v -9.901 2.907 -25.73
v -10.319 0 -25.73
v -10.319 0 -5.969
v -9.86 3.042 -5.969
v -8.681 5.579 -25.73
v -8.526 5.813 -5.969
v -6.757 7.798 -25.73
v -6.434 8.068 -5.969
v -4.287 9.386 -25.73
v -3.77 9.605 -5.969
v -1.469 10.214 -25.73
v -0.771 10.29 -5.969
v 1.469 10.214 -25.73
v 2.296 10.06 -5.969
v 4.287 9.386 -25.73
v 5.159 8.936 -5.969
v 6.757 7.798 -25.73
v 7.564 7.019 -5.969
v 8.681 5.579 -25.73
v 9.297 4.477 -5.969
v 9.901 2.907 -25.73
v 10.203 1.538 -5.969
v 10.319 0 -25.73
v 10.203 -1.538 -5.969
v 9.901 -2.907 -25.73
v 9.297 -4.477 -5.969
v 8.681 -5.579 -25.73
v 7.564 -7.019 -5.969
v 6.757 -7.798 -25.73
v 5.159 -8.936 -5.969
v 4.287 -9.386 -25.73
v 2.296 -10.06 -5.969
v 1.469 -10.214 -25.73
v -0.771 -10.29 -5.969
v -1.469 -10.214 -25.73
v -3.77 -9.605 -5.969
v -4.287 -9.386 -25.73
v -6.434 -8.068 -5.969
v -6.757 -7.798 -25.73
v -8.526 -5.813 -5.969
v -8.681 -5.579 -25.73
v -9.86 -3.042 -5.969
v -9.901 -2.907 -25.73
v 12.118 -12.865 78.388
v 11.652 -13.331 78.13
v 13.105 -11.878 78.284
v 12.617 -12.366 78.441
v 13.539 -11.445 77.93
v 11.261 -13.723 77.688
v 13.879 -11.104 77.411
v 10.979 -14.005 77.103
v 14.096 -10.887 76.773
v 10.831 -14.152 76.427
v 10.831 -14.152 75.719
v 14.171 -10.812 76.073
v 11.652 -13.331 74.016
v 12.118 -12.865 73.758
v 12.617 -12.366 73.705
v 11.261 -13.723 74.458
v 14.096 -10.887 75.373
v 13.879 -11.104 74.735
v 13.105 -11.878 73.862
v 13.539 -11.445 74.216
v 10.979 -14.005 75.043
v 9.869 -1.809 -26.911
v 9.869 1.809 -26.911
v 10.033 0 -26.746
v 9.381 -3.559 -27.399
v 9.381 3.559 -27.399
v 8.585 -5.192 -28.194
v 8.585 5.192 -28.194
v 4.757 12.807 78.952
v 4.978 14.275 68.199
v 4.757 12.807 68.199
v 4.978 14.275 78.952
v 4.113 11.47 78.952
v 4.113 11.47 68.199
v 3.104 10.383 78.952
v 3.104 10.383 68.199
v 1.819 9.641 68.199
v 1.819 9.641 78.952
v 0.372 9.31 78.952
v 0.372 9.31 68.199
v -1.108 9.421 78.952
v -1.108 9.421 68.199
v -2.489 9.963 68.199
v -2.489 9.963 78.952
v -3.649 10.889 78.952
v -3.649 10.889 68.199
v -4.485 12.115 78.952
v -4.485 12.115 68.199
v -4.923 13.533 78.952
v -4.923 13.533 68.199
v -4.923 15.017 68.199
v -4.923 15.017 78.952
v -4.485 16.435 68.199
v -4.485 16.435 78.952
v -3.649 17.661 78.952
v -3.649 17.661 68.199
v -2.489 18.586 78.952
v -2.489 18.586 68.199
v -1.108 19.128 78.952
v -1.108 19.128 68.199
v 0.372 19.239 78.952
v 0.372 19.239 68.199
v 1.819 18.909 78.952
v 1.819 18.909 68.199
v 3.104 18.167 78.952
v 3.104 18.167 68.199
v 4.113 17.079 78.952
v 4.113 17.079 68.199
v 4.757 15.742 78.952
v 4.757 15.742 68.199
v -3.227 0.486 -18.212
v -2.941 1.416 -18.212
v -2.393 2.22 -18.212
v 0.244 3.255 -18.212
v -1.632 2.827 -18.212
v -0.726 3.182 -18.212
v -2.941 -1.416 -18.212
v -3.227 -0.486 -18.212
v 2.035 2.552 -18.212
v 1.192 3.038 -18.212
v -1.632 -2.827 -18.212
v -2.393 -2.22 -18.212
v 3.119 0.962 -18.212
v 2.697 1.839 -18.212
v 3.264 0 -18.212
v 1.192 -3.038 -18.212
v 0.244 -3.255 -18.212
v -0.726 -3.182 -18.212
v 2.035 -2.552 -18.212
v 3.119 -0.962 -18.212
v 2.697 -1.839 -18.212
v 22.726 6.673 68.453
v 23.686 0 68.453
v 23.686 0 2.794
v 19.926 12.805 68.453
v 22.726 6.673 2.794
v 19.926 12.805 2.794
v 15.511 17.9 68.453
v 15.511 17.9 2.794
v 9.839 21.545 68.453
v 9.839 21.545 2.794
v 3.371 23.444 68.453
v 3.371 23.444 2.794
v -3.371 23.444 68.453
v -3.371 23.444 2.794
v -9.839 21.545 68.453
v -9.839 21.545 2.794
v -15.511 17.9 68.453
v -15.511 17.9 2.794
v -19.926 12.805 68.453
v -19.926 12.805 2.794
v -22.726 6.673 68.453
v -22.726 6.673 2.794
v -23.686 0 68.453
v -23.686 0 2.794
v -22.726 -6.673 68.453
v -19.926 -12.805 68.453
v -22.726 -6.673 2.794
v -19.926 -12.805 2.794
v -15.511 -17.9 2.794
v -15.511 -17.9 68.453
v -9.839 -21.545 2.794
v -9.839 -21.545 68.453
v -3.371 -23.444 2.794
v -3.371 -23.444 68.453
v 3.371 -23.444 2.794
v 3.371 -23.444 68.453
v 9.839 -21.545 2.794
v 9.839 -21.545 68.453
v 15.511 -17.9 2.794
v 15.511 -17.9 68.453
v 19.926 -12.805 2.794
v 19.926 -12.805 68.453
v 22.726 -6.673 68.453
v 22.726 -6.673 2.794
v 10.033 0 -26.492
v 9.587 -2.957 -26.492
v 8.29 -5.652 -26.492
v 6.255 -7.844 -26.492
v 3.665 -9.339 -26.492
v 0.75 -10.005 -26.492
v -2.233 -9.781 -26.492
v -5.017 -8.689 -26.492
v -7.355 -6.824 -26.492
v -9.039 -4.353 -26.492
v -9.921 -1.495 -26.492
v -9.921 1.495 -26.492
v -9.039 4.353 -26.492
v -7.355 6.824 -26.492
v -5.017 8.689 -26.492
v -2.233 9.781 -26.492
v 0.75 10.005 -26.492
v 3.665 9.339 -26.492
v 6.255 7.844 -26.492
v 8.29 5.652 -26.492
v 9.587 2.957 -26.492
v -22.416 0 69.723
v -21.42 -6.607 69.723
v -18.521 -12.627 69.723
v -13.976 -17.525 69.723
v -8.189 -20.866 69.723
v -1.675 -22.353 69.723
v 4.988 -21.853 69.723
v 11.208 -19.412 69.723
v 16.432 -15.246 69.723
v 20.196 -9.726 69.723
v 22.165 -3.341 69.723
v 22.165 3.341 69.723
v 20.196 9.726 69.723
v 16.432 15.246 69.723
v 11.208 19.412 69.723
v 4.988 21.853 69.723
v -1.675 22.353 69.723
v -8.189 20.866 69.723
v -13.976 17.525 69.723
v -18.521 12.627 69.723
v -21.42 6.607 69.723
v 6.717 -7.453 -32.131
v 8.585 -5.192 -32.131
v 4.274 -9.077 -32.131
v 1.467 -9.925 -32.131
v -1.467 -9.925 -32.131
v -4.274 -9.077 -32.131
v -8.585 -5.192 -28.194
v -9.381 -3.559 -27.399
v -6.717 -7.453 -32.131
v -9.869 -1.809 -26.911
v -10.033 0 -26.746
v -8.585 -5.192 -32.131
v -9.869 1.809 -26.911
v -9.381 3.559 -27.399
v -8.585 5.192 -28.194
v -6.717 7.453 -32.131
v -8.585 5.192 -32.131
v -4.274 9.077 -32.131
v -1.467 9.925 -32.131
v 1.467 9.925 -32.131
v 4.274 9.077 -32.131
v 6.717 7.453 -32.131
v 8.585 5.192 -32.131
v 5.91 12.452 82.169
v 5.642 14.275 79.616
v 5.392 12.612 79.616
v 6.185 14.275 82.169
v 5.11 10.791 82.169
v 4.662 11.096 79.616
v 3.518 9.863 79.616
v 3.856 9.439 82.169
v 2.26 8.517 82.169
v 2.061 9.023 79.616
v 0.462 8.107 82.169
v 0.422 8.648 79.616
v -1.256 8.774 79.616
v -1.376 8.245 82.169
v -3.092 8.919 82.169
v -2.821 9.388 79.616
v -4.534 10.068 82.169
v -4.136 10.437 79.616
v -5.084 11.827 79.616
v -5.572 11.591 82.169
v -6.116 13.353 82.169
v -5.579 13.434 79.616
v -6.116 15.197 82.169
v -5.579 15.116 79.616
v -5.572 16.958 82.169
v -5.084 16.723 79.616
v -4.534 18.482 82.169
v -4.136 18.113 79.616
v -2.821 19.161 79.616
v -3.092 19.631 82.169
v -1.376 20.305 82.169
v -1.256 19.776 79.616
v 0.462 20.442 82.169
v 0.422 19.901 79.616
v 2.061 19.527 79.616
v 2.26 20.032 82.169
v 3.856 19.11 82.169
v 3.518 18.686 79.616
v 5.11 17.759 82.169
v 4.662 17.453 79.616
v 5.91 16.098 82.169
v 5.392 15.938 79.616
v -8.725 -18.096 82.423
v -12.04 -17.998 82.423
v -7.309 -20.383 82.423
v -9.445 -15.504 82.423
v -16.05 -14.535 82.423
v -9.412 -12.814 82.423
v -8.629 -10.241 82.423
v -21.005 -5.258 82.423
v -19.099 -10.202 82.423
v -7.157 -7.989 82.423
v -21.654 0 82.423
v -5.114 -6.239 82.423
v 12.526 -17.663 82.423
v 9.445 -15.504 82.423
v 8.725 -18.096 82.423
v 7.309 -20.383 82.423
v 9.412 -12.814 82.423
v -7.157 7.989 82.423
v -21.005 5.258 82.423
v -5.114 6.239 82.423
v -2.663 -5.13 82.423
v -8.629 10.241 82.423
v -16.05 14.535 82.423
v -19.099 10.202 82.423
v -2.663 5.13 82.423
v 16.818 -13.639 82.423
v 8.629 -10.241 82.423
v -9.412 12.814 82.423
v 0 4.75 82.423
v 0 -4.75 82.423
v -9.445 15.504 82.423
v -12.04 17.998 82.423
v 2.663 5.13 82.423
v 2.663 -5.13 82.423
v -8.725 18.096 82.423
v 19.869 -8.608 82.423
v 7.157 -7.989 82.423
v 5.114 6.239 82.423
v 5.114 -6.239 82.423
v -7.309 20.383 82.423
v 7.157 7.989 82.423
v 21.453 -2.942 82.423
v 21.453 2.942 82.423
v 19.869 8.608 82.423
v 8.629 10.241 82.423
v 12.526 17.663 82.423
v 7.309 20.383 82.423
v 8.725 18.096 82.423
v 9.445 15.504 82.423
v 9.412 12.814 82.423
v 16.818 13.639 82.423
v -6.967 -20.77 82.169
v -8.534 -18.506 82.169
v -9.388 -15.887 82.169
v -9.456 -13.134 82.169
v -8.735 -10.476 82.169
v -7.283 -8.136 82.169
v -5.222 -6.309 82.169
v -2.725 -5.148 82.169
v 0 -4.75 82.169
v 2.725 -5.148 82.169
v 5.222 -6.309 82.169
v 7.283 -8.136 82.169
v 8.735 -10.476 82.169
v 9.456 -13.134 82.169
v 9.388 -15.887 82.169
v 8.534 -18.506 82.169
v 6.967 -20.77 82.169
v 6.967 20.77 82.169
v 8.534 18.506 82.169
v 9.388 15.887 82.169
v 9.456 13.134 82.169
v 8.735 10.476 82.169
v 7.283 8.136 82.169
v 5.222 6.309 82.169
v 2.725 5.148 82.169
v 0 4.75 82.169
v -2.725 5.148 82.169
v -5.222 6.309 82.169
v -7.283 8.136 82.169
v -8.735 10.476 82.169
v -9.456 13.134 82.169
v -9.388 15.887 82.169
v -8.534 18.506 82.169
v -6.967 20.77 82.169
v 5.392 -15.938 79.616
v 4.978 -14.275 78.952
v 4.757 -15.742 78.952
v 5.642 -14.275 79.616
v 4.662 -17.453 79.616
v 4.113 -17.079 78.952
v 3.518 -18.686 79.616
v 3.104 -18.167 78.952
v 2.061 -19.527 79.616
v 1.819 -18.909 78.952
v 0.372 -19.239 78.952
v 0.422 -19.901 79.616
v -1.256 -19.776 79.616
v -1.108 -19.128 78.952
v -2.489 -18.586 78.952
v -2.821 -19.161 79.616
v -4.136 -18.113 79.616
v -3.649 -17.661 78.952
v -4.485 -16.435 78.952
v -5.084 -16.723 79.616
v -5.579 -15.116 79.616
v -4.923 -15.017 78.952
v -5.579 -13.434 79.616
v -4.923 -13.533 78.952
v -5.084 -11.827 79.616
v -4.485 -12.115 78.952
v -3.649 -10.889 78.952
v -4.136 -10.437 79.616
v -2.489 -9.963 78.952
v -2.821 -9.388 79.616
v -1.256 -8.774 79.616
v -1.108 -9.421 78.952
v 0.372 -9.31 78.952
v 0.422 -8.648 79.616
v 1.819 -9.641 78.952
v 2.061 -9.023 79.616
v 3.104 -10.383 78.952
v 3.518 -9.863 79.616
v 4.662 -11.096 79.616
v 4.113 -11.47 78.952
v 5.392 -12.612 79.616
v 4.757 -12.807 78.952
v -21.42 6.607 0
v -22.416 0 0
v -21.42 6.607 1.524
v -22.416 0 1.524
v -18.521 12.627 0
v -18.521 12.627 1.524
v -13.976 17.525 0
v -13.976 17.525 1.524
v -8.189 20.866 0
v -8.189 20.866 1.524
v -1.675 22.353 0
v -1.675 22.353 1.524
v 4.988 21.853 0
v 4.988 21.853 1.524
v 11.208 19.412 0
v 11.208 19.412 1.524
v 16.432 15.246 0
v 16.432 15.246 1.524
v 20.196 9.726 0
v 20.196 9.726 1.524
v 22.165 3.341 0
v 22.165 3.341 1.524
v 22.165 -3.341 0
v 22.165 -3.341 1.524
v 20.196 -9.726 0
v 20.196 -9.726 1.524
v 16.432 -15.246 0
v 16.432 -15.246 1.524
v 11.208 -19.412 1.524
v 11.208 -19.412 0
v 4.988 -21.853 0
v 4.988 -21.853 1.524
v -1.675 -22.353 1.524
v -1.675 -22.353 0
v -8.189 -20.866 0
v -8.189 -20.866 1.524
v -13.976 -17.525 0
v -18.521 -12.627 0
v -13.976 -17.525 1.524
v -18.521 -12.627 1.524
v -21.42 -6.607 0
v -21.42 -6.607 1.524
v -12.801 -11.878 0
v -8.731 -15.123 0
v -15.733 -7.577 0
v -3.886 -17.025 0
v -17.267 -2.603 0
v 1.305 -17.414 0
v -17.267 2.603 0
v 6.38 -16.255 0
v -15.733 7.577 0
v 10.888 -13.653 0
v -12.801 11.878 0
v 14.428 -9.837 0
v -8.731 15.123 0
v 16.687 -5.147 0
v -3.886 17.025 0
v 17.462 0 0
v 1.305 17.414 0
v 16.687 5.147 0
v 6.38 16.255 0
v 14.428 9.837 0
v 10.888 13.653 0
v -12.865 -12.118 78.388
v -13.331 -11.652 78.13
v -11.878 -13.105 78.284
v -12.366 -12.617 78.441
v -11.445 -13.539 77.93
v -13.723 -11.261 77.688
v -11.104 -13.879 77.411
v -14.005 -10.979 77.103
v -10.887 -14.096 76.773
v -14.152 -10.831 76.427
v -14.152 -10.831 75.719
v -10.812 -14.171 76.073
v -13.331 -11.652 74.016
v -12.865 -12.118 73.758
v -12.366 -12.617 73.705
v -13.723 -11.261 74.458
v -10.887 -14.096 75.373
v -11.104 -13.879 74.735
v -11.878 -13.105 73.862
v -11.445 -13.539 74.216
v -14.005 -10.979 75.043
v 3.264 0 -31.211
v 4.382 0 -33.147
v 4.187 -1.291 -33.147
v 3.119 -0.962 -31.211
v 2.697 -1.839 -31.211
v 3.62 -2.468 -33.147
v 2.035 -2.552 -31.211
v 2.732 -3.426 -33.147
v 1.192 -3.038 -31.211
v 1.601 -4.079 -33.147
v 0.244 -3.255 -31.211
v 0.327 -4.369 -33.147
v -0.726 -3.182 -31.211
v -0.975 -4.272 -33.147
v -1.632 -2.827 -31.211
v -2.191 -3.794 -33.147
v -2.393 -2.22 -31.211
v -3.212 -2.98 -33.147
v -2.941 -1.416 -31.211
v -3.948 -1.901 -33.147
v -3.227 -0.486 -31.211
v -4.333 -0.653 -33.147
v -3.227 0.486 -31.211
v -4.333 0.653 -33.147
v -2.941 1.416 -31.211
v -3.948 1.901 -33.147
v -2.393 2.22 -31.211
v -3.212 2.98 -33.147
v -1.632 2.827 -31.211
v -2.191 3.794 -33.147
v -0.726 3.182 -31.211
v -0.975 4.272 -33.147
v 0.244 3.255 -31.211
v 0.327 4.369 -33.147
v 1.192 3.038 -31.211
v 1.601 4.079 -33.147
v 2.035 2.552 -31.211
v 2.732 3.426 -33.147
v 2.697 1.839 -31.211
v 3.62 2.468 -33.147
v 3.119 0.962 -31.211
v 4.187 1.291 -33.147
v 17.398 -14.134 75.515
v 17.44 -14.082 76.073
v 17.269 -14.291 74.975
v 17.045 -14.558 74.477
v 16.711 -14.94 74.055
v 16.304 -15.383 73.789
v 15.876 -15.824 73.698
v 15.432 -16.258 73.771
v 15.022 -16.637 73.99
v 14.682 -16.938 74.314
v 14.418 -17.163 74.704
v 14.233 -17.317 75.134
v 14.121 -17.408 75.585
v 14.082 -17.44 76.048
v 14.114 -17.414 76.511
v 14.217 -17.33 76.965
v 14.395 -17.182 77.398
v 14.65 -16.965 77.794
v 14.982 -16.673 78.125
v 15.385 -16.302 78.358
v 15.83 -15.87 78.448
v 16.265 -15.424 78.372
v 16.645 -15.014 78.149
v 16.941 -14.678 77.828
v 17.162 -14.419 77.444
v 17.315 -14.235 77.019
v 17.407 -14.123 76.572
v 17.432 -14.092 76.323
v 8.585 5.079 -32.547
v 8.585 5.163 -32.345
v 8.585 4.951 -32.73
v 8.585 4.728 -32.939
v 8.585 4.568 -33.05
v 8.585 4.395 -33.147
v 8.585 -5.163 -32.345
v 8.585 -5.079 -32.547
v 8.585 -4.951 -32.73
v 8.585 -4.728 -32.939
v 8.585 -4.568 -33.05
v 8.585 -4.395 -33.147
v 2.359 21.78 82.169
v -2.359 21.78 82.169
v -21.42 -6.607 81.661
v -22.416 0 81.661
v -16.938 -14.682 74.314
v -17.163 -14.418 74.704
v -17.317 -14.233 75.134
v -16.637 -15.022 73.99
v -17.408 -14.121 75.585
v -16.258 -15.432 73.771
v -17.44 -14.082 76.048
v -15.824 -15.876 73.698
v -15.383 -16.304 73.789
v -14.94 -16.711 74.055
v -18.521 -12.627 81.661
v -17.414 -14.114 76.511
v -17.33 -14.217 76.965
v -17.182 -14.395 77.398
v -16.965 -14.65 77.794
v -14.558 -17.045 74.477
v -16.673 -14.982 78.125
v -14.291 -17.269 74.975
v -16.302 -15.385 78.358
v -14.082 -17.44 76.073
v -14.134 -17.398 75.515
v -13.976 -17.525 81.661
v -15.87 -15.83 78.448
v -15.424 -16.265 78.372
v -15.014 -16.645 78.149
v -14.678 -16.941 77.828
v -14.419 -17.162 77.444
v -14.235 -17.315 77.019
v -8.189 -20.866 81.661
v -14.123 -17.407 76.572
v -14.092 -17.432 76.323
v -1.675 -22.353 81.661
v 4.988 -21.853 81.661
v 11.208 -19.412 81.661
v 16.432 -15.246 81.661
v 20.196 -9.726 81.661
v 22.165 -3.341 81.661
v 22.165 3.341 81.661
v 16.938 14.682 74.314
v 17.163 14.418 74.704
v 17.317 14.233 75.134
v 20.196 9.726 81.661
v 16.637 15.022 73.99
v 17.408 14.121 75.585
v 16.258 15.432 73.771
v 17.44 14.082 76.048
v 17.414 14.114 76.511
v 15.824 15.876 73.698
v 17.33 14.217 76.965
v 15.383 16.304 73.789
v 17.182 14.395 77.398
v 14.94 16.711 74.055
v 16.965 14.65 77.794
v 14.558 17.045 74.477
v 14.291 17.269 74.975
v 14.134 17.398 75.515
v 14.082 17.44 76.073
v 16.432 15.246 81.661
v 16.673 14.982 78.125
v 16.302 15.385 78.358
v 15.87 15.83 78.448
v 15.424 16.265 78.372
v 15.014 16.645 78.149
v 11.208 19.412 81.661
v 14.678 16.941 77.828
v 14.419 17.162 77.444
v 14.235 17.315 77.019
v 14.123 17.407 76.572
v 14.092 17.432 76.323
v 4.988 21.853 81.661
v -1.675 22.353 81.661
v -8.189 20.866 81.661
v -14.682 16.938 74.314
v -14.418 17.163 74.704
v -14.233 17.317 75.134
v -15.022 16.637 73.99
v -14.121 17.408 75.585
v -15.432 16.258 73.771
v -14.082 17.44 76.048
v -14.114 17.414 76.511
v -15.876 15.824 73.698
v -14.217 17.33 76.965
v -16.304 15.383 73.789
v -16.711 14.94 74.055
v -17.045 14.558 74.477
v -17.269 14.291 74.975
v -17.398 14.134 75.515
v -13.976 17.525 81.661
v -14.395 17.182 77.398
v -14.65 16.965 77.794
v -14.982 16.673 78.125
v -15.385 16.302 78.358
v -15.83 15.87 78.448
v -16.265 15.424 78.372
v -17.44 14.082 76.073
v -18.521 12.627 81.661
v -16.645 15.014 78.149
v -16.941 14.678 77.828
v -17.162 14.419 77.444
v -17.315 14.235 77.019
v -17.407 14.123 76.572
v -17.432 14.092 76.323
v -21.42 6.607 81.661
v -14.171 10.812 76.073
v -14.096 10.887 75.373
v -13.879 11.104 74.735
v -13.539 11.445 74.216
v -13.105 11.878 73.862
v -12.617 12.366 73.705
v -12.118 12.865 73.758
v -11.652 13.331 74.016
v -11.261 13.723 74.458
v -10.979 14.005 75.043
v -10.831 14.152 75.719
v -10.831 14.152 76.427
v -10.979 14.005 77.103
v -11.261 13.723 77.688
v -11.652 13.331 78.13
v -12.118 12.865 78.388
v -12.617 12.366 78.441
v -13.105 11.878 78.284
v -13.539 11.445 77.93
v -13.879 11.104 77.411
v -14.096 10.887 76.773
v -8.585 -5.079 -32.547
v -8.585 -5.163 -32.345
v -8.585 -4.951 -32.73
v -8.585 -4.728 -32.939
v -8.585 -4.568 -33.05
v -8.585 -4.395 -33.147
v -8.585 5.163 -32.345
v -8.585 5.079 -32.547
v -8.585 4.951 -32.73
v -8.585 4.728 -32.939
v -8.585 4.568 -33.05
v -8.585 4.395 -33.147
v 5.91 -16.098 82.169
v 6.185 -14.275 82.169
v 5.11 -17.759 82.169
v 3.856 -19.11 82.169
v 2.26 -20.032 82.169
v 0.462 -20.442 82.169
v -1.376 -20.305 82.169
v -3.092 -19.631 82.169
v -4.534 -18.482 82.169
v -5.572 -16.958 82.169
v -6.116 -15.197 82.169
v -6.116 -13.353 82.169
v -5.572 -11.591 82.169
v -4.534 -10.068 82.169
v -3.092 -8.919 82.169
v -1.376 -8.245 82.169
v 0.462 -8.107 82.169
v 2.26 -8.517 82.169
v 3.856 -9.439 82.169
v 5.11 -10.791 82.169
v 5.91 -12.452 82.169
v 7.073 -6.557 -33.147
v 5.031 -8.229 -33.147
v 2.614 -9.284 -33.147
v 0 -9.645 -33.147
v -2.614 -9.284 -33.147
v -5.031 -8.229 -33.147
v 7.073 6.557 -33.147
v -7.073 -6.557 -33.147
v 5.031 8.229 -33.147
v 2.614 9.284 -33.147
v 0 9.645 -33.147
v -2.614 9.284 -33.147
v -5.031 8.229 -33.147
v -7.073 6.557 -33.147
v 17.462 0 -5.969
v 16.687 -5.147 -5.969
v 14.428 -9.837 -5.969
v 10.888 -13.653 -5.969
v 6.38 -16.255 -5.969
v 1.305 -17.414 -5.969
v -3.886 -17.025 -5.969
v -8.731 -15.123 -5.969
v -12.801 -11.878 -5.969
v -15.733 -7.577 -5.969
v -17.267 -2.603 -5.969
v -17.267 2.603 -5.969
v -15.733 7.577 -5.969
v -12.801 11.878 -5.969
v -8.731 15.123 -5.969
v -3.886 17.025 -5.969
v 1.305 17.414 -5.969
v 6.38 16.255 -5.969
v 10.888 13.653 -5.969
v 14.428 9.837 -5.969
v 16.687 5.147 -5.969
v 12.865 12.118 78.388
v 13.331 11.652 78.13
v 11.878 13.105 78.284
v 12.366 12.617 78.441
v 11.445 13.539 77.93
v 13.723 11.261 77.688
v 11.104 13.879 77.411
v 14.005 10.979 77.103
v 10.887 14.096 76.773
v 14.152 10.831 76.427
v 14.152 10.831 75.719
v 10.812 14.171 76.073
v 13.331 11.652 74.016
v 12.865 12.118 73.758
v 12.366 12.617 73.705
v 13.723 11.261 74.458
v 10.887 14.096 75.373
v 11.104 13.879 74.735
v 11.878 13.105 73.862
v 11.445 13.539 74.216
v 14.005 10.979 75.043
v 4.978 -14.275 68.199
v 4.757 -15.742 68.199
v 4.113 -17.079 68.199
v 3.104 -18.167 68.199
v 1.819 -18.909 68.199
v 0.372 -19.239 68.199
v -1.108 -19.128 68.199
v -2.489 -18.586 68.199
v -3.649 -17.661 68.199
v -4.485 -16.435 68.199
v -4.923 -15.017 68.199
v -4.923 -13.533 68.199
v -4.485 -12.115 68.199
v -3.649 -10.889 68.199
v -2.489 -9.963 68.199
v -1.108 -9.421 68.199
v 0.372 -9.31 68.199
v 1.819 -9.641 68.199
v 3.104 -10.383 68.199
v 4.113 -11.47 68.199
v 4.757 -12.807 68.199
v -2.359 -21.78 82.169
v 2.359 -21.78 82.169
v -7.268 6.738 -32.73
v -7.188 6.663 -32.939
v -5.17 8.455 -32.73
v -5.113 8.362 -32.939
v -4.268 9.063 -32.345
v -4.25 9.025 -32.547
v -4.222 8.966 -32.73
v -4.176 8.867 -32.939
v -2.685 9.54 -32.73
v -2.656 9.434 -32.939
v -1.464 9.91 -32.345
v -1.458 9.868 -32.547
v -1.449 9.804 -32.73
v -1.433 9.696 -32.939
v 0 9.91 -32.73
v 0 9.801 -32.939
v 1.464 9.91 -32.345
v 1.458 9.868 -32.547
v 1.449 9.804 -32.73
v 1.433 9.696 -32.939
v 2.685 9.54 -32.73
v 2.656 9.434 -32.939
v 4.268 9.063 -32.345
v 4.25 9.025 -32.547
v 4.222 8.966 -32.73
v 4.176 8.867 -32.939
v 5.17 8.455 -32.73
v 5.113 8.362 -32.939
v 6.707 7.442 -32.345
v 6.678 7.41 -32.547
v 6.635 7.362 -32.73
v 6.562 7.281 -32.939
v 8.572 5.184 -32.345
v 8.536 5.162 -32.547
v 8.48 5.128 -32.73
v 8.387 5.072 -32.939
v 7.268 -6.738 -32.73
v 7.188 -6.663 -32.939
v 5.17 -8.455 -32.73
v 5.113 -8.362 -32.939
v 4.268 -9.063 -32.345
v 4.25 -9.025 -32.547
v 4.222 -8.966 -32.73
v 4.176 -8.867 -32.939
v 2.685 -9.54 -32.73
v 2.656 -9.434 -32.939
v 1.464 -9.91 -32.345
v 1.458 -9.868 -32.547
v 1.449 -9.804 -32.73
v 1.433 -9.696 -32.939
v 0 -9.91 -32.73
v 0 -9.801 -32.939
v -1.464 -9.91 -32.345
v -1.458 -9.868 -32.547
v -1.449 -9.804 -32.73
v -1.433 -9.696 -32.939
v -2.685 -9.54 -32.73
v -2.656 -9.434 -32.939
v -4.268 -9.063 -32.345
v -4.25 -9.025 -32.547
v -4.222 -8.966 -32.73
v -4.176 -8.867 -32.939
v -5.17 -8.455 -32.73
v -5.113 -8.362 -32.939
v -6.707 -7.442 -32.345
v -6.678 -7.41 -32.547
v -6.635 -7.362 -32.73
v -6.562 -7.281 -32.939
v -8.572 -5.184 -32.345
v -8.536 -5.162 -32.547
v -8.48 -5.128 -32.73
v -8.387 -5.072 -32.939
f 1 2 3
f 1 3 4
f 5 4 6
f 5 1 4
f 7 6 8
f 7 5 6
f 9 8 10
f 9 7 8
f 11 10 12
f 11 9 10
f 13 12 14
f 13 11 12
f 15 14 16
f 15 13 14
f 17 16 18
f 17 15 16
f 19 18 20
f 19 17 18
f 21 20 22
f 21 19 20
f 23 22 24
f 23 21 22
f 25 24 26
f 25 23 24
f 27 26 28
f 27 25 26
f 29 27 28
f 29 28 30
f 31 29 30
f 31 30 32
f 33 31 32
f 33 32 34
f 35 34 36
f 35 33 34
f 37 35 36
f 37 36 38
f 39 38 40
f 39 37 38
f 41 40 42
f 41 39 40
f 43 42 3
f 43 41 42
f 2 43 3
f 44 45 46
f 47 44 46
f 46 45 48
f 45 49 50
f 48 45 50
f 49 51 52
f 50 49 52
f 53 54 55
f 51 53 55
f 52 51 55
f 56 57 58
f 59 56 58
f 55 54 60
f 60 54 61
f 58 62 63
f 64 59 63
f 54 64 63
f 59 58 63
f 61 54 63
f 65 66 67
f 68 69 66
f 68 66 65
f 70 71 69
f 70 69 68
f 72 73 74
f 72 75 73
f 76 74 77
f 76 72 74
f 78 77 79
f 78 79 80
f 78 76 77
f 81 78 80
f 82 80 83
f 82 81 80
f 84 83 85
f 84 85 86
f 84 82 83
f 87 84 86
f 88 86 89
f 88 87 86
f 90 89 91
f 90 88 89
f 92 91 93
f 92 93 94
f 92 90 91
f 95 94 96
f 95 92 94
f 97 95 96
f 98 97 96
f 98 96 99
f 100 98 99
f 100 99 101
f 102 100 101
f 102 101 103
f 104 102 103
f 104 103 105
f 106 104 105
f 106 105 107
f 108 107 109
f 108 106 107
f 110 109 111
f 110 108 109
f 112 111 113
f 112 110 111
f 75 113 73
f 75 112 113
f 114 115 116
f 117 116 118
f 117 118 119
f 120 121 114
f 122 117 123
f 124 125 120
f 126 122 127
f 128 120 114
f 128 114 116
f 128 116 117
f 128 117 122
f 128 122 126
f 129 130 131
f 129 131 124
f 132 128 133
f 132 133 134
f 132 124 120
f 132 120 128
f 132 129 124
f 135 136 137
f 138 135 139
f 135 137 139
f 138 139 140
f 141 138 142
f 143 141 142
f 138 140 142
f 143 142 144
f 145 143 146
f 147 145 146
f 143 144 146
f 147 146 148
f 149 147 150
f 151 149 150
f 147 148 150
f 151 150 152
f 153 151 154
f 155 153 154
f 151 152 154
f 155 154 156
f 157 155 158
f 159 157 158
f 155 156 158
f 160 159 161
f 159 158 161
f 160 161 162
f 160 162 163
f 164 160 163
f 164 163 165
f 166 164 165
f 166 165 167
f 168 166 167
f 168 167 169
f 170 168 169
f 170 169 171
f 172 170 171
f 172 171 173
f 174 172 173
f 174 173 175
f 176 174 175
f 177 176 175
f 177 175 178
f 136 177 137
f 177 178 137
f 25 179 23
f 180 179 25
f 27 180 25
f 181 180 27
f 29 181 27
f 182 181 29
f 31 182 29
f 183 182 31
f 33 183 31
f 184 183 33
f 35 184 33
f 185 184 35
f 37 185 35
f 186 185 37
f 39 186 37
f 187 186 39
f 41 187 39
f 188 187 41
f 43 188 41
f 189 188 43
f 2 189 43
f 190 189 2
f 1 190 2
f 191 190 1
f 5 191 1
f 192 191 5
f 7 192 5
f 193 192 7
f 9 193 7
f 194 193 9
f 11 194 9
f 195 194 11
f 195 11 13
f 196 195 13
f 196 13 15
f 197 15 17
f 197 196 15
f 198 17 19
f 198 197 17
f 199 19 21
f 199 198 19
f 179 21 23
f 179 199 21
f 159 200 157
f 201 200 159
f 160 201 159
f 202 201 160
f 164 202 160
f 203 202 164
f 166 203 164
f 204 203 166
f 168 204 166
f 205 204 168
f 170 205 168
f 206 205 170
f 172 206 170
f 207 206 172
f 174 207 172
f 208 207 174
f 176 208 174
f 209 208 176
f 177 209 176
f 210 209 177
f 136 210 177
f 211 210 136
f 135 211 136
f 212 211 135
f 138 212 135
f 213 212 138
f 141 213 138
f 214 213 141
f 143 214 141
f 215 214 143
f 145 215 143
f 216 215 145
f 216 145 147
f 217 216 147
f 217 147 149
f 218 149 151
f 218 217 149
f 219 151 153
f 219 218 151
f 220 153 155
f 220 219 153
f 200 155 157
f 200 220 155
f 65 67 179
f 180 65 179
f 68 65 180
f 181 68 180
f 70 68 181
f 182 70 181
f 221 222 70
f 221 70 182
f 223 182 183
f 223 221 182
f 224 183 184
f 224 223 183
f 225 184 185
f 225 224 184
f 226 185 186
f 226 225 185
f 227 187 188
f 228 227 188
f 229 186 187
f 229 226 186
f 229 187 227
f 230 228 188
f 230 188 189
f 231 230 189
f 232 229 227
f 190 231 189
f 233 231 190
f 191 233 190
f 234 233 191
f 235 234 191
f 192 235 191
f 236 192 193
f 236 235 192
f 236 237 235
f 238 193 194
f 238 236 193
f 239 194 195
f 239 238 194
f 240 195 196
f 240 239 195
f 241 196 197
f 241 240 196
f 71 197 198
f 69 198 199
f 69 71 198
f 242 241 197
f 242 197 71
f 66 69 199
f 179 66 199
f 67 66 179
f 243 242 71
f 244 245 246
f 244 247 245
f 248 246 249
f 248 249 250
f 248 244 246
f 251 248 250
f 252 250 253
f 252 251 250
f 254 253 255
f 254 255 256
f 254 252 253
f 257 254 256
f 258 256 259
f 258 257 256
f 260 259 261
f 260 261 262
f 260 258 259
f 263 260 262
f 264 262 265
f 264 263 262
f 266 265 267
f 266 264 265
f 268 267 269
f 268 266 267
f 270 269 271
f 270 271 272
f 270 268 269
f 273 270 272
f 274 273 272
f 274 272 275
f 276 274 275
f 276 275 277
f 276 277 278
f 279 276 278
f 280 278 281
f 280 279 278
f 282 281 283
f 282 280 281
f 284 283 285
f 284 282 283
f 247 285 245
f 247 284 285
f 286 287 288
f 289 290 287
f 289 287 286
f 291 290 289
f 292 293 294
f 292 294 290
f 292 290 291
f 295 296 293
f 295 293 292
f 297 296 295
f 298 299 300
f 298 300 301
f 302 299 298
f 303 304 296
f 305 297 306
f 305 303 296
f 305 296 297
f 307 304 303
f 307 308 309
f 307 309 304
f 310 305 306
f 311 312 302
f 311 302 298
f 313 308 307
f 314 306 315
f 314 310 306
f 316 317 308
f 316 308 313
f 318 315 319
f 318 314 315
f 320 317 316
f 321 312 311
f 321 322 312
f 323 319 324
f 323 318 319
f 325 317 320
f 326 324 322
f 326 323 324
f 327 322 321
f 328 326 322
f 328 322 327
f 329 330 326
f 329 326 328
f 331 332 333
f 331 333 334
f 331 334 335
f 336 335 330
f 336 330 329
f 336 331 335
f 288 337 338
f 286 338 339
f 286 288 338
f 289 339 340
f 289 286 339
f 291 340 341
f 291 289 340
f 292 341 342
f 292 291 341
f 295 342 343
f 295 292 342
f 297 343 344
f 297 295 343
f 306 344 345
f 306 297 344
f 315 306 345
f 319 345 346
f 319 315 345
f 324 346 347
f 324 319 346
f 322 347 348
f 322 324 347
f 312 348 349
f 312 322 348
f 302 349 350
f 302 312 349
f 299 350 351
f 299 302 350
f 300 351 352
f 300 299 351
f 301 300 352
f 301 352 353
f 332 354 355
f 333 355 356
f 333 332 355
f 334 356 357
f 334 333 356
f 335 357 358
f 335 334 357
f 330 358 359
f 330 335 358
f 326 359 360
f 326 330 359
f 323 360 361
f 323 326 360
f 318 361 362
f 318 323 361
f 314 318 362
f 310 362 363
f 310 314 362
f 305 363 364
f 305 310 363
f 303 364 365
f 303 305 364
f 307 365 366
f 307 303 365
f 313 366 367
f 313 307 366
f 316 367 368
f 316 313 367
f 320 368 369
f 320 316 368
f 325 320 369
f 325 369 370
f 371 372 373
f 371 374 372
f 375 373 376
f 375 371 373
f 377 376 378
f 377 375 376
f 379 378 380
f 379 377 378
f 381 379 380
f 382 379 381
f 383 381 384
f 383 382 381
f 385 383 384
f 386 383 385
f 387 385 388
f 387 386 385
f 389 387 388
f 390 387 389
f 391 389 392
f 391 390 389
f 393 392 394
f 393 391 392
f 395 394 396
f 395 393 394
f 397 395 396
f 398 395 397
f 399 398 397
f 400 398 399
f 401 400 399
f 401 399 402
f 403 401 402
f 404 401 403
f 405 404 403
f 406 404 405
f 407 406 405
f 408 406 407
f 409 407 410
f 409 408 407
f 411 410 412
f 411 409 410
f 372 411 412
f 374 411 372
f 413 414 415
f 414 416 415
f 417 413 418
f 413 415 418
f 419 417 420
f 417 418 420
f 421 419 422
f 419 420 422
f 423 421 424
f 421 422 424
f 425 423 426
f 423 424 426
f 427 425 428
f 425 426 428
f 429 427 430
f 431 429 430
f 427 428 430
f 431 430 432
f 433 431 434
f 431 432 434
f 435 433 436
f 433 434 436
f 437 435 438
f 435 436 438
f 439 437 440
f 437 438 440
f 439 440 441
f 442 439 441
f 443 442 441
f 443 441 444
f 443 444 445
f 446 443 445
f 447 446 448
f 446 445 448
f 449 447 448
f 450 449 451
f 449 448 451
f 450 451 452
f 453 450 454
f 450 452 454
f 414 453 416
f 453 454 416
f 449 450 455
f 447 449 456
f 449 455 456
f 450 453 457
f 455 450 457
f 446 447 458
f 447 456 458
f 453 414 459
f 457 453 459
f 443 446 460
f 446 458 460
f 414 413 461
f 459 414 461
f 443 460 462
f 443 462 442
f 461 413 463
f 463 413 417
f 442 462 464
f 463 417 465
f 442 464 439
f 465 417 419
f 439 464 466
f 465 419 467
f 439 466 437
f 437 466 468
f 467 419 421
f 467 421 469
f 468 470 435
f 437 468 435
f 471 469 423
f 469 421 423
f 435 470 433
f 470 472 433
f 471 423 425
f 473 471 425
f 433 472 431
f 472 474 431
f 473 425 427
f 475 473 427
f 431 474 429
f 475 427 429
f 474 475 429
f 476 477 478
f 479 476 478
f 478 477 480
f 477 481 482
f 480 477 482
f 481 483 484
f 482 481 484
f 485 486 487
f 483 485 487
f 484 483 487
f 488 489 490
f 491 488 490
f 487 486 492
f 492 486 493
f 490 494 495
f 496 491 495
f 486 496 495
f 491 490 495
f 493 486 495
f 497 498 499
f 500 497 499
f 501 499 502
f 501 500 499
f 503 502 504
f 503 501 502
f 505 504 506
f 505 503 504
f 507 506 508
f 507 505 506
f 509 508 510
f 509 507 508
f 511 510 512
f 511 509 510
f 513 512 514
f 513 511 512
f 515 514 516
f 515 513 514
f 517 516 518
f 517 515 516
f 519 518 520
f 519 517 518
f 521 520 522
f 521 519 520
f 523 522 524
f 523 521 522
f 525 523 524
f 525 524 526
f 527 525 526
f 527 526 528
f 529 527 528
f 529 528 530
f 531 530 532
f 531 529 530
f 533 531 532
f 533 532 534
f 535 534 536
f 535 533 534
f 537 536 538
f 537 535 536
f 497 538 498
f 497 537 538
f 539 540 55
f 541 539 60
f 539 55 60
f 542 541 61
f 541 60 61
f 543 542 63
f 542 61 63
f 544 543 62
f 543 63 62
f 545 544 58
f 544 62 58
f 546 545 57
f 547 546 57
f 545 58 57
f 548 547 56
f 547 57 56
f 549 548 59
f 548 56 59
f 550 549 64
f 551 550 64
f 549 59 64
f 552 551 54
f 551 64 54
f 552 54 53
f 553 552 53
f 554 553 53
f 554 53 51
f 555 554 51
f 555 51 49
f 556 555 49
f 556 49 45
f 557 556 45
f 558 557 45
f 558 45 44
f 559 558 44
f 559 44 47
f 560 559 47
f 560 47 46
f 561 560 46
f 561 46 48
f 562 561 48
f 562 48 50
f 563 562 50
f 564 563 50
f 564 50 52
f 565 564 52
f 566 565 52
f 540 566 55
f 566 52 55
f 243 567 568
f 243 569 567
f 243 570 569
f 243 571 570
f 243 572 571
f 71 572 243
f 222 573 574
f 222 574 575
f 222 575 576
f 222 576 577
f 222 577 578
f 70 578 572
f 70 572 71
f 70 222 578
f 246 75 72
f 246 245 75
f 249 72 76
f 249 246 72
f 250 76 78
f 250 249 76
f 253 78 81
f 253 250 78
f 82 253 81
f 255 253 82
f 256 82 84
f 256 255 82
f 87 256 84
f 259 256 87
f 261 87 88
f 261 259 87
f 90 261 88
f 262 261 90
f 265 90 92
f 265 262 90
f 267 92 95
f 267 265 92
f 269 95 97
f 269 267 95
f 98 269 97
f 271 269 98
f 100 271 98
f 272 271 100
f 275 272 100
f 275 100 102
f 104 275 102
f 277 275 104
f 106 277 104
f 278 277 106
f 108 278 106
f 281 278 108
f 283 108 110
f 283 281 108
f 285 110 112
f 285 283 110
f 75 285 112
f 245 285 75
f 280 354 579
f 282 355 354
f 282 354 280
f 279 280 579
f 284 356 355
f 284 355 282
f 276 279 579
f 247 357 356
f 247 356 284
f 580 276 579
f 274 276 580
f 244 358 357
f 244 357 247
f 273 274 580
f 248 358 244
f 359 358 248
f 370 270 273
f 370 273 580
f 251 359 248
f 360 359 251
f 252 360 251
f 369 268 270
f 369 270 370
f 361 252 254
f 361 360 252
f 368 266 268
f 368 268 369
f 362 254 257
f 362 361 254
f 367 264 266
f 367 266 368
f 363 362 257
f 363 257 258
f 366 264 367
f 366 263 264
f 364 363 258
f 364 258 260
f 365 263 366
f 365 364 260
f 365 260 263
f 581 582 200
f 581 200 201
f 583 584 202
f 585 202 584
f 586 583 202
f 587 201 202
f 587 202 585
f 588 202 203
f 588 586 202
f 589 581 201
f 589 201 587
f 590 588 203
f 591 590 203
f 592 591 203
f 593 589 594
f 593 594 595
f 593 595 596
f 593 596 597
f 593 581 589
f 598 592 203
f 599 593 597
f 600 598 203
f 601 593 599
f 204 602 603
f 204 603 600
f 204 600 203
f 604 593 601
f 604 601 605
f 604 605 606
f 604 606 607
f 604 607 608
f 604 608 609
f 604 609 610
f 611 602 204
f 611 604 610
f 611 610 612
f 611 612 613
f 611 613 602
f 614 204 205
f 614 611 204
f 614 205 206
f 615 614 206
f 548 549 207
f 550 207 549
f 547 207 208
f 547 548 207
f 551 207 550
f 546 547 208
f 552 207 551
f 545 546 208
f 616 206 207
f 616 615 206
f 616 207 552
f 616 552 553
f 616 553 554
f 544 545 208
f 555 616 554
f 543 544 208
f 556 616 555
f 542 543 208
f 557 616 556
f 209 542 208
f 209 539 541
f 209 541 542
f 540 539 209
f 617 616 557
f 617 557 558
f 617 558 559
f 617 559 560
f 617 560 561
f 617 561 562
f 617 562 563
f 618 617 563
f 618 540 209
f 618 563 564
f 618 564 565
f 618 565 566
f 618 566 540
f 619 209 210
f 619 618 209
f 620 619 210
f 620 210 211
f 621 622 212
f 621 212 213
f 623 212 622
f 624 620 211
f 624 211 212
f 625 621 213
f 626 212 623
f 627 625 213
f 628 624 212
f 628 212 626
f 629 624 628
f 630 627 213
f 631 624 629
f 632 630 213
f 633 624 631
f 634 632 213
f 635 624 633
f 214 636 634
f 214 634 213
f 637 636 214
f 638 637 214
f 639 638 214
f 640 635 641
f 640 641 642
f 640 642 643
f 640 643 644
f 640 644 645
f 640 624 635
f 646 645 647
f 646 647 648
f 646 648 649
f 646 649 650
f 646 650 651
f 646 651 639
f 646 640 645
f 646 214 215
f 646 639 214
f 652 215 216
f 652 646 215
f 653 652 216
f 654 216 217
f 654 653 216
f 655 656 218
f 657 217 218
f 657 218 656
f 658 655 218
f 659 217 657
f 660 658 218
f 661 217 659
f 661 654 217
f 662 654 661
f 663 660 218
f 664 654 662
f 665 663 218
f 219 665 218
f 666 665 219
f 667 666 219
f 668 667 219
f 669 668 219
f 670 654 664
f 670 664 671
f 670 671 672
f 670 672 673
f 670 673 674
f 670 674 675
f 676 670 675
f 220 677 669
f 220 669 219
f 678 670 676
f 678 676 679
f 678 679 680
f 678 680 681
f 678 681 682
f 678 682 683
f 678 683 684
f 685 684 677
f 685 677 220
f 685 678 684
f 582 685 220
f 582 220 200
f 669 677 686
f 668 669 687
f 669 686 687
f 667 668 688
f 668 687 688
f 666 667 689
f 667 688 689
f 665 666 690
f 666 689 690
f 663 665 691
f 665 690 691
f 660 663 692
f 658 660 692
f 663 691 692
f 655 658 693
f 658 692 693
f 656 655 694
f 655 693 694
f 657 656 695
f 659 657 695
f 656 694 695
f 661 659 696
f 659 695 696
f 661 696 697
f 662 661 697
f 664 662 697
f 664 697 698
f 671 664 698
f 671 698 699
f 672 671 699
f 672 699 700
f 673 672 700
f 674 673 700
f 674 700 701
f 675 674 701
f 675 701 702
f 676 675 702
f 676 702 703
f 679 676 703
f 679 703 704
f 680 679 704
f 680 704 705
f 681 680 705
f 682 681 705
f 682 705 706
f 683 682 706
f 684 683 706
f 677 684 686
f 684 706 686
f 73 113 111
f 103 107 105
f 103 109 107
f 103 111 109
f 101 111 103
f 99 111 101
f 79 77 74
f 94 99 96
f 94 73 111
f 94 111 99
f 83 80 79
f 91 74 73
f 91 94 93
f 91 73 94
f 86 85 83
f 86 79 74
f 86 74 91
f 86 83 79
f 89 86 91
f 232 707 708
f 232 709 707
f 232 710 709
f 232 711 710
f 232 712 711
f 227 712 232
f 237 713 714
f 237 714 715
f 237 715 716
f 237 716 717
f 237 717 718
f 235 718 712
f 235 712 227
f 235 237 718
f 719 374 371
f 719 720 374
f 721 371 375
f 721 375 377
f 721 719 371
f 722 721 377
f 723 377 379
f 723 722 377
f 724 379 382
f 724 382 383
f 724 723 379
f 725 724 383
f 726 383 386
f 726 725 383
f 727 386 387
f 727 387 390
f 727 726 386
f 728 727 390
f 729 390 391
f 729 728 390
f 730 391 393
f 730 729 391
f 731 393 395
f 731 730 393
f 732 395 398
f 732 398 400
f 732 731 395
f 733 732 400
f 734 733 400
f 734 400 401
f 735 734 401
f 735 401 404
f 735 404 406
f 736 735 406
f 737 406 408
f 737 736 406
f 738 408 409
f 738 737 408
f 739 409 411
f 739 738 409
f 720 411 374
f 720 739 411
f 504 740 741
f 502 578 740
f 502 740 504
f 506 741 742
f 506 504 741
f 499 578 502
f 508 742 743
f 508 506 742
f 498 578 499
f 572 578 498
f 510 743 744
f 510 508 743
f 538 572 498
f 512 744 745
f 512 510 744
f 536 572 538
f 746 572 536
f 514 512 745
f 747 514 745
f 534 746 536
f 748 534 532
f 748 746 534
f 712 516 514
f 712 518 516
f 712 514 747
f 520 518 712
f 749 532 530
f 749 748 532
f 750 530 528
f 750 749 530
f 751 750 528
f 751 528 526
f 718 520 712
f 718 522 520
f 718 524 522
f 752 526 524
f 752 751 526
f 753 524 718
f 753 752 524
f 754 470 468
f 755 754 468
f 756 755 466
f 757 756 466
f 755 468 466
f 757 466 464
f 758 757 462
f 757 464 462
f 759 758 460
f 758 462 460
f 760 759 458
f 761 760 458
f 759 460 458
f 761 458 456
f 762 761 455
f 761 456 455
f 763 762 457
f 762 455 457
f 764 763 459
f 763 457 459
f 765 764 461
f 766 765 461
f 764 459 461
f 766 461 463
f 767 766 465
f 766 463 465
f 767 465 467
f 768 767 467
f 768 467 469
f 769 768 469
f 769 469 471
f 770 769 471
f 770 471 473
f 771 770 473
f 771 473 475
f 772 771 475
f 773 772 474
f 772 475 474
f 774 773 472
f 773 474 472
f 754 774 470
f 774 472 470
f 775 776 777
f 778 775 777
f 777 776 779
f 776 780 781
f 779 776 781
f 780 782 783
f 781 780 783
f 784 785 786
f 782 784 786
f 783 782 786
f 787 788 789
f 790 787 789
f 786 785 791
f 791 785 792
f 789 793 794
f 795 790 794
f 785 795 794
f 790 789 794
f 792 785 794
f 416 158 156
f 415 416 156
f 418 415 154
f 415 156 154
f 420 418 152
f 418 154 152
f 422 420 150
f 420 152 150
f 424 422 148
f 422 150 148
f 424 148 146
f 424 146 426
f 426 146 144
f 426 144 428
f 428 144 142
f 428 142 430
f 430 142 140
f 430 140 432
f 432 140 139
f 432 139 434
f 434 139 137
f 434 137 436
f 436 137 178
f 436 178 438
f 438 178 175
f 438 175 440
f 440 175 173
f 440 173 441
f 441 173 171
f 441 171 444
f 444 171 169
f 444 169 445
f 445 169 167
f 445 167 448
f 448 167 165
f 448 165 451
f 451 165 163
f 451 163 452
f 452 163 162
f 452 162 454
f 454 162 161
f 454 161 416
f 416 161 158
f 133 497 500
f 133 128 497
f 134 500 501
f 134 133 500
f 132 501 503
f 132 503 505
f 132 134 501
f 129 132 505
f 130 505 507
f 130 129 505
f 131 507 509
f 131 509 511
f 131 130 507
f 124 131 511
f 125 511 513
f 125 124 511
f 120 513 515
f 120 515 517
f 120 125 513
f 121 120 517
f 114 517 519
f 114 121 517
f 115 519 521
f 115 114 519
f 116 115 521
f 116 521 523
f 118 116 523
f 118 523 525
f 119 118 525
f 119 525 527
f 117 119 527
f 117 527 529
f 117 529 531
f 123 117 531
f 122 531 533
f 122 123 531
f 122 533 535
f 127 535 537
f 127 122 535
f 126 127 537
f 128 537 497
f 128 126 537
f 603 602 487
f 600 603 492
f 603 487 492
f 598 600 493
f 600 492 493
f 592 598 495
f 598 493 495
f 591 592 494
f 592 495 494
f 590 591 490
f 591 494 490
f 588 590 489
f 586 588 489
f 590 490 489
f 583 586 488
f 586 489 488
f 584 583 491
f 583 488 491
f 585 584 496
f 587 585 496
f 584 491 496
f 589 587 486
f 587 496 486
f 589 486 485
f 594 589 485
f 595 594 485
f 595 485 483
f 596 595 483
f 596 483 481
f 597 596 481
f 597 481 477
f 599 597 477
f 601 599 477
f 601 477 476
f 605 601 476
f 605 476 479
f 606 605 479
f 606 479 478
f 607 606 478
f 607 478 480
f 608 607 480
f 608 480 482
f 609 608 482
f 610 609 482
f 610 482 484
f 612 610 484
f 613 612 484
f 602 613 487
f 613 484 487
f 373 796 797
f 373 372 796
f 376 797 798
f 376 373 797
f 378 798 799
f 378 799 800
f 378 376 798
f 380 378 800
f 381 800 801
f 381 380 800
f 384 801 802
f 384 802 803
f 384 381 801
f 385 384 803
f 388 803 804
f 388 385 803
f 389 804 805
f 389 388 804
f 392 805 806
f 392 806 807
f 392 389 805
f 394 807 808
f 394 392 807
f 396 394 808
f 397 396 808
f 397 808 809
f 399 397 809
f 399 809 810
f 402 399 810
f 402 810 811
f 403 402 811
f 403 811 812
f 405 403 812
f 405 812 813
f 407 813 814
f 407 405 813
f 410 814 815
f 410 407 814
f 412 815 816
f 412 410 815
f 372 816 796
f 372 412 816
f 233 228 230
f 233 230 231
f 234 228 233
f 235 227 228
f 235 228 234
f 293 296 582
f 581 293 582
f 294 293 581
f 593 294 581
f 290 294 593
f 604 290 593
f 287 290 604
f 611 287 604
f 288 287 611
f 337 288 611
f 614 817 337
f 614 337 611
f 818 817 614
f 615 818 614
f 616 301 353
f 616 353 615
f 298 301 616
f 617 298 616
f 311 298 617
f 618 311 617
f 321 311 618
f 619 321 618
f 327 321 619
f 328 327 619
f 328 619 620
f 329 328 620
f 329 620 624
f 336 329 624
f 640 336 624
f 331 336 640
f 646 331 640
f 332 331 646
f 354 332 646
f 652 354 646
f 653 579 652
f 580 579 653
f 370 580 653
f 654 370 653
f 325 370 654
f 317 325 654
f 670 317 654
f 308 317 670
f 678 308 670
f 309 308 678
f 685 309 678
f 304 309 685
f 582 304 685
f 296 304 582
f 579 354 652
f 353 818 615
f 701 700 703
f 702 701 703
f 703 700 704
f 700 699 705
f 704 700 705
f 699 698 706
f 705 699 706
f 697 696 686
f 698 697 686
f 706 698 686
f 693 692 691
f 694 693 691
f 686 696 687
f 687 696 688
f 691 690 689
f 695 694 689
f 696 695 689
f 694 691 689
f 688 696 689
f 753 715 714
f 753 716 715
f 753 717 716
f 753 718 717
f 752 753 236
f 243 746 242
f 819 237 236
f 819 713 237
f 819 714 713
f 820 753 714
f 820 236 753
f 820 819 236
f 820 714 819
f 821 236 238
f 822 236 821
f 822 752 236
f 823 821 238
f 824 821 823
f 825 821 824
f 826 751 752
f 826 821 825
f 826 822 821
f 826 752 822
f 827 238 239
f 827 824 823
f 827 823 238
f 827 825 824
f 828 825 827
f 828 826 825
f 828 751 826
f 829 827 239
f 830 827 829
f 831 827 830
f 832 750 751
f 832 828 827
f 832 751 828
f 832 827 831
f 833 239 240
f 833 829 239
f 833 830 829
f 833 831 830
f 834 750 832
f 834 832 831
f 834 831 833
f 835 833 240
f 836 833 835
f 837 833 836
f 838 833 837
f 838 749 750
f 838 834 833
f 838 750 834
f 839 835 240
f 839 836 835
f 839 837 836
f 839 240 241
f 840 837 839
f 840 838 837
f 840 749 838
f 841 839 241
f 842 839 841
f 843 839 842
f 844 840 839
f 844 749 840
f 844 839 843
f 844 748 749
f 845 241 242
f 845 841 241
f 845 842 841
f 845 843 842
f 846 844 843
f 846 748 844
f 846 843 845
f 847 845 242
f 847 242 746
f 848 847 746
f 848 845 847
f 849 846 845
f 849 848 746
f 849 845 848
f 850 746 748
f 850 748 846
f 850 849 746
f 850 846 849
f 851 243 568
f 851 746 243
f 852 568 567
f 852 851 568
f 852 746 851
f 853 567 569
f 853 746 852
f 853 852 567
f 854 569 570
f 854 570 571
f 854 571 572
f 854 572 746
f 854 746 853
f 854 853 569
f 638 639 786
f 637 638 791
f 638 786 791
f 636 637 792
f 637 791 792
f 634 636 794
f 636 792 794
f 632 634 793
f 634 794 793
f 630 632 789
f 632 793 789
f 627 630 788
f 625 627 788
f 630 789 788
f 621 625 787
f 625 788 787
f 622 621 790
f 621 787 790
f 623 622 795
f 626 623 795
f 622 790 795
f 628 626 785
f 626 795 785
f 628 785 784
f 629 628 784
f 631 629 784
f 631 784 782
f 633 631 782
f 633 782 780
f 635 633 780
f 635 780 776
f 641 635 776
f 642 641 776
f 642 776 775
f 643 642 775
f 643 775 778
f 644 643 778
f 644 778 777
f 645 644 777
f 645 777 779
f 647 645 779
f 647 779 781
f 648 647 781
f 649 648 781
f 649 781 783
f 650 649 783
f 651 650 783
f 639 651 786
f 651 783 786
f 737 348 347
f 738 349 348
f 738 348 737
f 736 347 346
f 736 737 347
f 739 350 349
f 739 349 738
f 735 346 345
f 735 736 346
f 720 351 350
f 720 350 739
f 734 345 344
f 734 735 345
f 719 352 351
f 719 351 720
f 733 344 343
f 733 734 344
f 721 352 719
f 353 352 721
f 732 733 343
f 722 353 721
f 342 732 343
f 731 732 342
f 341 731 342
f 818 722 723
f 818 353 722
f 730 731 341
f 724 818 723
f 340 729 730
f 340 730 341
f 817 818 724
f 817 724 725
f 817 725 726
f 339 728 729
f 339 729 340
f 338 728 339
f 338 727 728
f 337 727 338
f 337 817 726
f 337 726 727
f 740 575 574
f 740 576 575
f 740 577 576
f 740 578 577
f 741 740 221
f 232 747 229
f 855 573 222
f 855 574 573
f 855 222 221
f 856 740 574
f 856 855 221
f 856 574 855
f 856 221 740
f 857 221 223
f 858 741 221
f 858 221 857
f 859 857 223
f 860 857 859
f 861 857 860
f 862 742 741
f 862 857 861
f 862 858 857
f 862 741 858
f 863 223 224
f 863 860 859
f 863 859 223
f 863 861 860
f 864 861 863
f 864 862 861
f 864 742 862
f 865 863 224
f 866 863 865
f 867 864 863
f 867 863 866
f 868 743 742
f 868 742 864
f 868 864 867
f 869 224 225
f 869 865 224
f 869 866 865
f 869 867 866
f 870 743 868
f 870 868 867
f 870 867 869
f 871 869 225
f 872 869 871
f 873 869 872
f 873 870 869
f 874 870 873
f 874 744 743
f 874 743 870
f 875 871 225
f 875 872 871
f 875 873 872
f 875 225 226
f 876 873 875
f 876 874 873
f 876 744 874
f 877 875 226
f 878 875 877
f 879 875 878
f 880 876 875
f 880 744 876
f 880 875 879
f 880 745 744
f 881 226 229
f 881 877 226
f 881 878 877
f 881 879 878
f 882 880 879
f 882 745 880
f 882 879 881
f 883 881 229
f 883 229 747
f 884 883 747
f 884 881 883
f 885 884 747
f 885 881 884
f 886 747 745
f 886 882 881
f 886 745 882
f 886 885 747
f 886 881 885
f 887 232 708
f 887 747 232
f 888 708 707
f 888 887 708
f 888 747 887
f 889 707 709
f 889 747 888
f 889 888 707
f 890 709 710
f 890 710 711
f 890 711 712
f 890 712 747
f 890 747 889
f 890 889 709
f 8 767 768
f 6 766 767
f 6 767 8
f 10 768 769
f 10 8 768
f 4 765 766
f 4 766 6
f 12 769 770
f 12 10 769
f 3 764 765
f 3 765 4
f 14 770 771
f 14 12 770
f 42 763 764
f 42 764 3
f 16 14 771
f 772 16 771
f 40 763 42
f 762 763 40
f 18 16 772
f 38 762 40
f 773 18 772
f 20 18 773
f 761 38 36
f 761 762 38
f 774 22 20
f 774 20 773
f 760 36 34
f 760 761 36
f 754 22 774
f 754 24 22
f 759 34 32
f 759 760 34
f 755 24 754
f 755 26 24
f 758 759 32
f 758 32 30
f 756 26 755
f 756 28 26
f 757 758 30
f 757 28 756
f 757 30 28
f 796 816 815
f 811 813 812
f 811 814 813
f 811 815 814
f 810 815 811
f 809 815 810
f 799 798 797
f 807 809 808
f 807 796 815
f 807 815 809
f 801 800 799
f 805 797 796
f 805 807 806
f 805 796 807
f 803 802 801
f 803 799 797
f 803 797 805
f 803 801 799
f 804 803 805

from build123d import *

# Parameters (mm, degrees)
SKETCH1_R          = 23.6855
EXTRUDE1_DEPTH     = 82.423
CHAMFER1_SIZE      = 0.762
SKETCH6_R          = 17.4625
EXTRUDE2_DEPTH     = 5.969
SKETCH7_W          = 27.178
SKETCH7_H          = 10.31875
CUT_EXTRUDE4_DEPTH = 19.84248
HOLE1_D            = 4.7498
HOLE1_DEPTH        = 4.7498
CIRPATTERN1_COUNT  = 4
LPATTERN1_COUNT    = 2
LPATTERN1_PITCH    = 28.5496


with BuildPart() as part:
    # Sketch1 → Extrude1 (new body)
    with BuildSketch(Plane.XY):
        Circle(SKETCH1_R)
    extrude(amount=EXTRUDE1_DEPTH)

    # Sketch2 → Cut-Revolve1 (revolve, cut)
    with BuildSketch(Plane(origin=(0, 0, 0), x_dir=(1, 0, 0), z_dir=(0, 1, 0)), mode=Mode.PRIVATE) as cut_revolve1_sk:
        Polygon((23.6855, -82.423), (23.6855, -68.453), (22.4155, -69.723), (22.4155, -82.423), align=None)
    revolve(cut_revolve1_sk.sketch.rotate(Axis((0, 0, 0), (0, 0, 1)), 180), axis=Axis((0, 0, 0), (0, 0, 1)), mode=Mode.SUBTRACT)  # turned: the seam where the file's is

    # Sketch3 → Cut-Revolve2 (revolve, cut)
    with BuildSketch(Plane(origin=(0, 0, 0), x_dir=(1, 0, 0), z_dir=(0, 1, 0)), mode=Mode.PRIVATE) as cut_revolve2_sk:
        Polygon((22.4155, 0), (22.4155, -1.524), (23.6855, -2.794), (23.6855, 0), align=None)
    revolve(cut_revolve2_sk.sketch.rotate(Axis((0, 0, 0), (0, 0, -1)), 180), axis=Axis((0, 0, 0), (0, 0, -1)), mode=Mode.SUBTRACT)  # turned: the seam where the file's is

    # Chamfer1
    chamfer1_edges = [part.edges().sort_by_distance(p)[0] for p in [
        (22.4155, 0, 82.423),
    ]]
    chamfer(chamfer1_edges, length=CHAMFER1_SIZE)

    # S2D0002 → Cut-Revolve3 (revolve, cut)
    with BuildSketch(Plane(origin=(0, 0, 0), x_dir=(0, -1, 0), z_dir=(1, 0, 0)), mode=Mode.PRIVATE) as cut_revolve3_sk:
        Polygon((20.4597, -82.169), (23.7998, -82.169), (23.7998, -82.423), (14.2748, -82.423), (14.2748, -68.199), (19.2532, -68.199), (19.2532, -78.952393135), (19.917106865, -79.6163), align=None)
    cut_revolve3 = revolve(cut_revolve3_sk.sketch.rotate(Axis((0, -14.2748, 14.6685), (0, 0, -1)), 270), axis=Axis((0, -14.2748, 14.6685), (0, 0, -1)), mode=Mode.SUBTRACT)  # turned: the seam where the file's is

    # Sketch6 → Extrude2 (add)
    with BuildSketch(Plane(origin=(0, 0, 0), x_dir=(-1, 0, 0), z_dir=(0, 0, -1))):
        with Locations(Location((0, 0, 0), (0, 0, 180))):  # turned: the seam where the file's is
            Circle(SKETCH6_R)
    extrude(amount=EXTRUDE2_DEPTH)

    # Sketch7 → Revolve1 (revolve)
    with BuildSketch(Plane(origin=(0, 0, 0), x_dir=(0, 0, -1), z_dir=(1, 0, 0)), mode=Mode.PRIVATE) as revolve1_sk:
        with Locations((19.558, -5.159375)):
            Rectangle(SKETCH7_W, SKETCH7_H)
    revolve(revolve1_sk.sketch.rotate(Axis((0, 0, 0), (0, 0, -1)), 90), axis=Axis((0, 0, 0), (0, 0, -1)))  # turned: the seam where the file's is

    # S2D0001 → Cut-Revolve5 (revolve, cut)
    with BuildSketch(Plane(origin=(0, 0, 0), x_dir=(1, 0, 0), z_dir=(0, 1, 0))):
        Polygon((3.2639, 31.211260017), (3.2639, 18.2118), (0, 18.2118), (0, 33.147), (4.3815, 33.147), align=None)
    revolve(axis=Axis((0, 0, 31.308359971), (0, 0, -1)), mode=Mode.SUBTRACT)

    # Sketch9 → Cut-Revolve6 (revolve, cut)
    with BuildSketch(Plane(origin=(0, 0, 0), x_dir=(0, -1, 0), z_dir=(1, 0, 0)), mode=Mode.PRIVATE) as cut_revolve6_sk:
        with BuildLine():
            Line((-10.31875, 25.7302), (-10.033, 26.4922))
            Line((-10.033, 26.4922), (-10.033, 32.131))
            ThreePointArc((-10.033, 32.131), (-9.932678675, 32.674796865), (-9.644922533, 33.147))
            Line((-9.644922533, 33.147), (-10.31875, 33.147))
            Line((-10.31875, 33.147), (-10.31875, 25.7302))
        make_face()
    revolve(cut_revolve6_sk.sketch.rotate(Axis((0, 0, -12.65936), (0, 0, -1)), 90), axis=Axis((0, 0, -12.65936), (0, 0, -1)), mode=Mode.SUBTRACT)  # turned: the seam where the file's is

    # Sketch13 → Cut-Extrude4 (cut, symmetric)
    with BuildSketch(Plane(origin=(0, 0, 0), x_dir=(1, 0, 0), z_dir=(0, 1, 0))):
        Polygon((8.5852, 33.147), (8.5852, 28.194), (10.033, 26.7462), (10.033, 33.147), align=None)
        Polygon((-8.5852, 33.147), (-8.5852, 28.194), (-10.033, 26.7462), (-10.033, 33.147), align=None)
    extrude(amount=CUT_EXTRUDE4_DEPTH, both=True, mode=Mode.SUBTRACT)

    # Hole1
    with Locations(Plane(origin=(-15.850152054, 15.850152054, 76.073), x_dir=(0.707106781, 0.707106781, 0), z_dir=(-0.707106781, 0.707106781, 0))):
        with Locations((0, 0)):
            hole1 = Hole(HOLE1_D / 2, depth=HOLE1_DEPTH)

    # CirPattern1: Hole1 ×4 about axis
    cirpattern1_axis = Axis((0, 0, 0), (0, 0, 1))
    for i in range(1, CIRPATTERN1_COUNT):
        add(hole1.rotate(cirpattern1_axis, i * 360 / CIRPATTERN1_COUNT), mode=Mode.SUBTRACT)

    # LPattern1: Cut-Revolve3 ×2
    with Locations(*[(0, i * LPATTERN1_PITCH, 0) for i in range(1, LPATTERN1_COUNT)]):
        add(cut_revolve3, mode=Mode.SUBTRACT)


solid = part.part
